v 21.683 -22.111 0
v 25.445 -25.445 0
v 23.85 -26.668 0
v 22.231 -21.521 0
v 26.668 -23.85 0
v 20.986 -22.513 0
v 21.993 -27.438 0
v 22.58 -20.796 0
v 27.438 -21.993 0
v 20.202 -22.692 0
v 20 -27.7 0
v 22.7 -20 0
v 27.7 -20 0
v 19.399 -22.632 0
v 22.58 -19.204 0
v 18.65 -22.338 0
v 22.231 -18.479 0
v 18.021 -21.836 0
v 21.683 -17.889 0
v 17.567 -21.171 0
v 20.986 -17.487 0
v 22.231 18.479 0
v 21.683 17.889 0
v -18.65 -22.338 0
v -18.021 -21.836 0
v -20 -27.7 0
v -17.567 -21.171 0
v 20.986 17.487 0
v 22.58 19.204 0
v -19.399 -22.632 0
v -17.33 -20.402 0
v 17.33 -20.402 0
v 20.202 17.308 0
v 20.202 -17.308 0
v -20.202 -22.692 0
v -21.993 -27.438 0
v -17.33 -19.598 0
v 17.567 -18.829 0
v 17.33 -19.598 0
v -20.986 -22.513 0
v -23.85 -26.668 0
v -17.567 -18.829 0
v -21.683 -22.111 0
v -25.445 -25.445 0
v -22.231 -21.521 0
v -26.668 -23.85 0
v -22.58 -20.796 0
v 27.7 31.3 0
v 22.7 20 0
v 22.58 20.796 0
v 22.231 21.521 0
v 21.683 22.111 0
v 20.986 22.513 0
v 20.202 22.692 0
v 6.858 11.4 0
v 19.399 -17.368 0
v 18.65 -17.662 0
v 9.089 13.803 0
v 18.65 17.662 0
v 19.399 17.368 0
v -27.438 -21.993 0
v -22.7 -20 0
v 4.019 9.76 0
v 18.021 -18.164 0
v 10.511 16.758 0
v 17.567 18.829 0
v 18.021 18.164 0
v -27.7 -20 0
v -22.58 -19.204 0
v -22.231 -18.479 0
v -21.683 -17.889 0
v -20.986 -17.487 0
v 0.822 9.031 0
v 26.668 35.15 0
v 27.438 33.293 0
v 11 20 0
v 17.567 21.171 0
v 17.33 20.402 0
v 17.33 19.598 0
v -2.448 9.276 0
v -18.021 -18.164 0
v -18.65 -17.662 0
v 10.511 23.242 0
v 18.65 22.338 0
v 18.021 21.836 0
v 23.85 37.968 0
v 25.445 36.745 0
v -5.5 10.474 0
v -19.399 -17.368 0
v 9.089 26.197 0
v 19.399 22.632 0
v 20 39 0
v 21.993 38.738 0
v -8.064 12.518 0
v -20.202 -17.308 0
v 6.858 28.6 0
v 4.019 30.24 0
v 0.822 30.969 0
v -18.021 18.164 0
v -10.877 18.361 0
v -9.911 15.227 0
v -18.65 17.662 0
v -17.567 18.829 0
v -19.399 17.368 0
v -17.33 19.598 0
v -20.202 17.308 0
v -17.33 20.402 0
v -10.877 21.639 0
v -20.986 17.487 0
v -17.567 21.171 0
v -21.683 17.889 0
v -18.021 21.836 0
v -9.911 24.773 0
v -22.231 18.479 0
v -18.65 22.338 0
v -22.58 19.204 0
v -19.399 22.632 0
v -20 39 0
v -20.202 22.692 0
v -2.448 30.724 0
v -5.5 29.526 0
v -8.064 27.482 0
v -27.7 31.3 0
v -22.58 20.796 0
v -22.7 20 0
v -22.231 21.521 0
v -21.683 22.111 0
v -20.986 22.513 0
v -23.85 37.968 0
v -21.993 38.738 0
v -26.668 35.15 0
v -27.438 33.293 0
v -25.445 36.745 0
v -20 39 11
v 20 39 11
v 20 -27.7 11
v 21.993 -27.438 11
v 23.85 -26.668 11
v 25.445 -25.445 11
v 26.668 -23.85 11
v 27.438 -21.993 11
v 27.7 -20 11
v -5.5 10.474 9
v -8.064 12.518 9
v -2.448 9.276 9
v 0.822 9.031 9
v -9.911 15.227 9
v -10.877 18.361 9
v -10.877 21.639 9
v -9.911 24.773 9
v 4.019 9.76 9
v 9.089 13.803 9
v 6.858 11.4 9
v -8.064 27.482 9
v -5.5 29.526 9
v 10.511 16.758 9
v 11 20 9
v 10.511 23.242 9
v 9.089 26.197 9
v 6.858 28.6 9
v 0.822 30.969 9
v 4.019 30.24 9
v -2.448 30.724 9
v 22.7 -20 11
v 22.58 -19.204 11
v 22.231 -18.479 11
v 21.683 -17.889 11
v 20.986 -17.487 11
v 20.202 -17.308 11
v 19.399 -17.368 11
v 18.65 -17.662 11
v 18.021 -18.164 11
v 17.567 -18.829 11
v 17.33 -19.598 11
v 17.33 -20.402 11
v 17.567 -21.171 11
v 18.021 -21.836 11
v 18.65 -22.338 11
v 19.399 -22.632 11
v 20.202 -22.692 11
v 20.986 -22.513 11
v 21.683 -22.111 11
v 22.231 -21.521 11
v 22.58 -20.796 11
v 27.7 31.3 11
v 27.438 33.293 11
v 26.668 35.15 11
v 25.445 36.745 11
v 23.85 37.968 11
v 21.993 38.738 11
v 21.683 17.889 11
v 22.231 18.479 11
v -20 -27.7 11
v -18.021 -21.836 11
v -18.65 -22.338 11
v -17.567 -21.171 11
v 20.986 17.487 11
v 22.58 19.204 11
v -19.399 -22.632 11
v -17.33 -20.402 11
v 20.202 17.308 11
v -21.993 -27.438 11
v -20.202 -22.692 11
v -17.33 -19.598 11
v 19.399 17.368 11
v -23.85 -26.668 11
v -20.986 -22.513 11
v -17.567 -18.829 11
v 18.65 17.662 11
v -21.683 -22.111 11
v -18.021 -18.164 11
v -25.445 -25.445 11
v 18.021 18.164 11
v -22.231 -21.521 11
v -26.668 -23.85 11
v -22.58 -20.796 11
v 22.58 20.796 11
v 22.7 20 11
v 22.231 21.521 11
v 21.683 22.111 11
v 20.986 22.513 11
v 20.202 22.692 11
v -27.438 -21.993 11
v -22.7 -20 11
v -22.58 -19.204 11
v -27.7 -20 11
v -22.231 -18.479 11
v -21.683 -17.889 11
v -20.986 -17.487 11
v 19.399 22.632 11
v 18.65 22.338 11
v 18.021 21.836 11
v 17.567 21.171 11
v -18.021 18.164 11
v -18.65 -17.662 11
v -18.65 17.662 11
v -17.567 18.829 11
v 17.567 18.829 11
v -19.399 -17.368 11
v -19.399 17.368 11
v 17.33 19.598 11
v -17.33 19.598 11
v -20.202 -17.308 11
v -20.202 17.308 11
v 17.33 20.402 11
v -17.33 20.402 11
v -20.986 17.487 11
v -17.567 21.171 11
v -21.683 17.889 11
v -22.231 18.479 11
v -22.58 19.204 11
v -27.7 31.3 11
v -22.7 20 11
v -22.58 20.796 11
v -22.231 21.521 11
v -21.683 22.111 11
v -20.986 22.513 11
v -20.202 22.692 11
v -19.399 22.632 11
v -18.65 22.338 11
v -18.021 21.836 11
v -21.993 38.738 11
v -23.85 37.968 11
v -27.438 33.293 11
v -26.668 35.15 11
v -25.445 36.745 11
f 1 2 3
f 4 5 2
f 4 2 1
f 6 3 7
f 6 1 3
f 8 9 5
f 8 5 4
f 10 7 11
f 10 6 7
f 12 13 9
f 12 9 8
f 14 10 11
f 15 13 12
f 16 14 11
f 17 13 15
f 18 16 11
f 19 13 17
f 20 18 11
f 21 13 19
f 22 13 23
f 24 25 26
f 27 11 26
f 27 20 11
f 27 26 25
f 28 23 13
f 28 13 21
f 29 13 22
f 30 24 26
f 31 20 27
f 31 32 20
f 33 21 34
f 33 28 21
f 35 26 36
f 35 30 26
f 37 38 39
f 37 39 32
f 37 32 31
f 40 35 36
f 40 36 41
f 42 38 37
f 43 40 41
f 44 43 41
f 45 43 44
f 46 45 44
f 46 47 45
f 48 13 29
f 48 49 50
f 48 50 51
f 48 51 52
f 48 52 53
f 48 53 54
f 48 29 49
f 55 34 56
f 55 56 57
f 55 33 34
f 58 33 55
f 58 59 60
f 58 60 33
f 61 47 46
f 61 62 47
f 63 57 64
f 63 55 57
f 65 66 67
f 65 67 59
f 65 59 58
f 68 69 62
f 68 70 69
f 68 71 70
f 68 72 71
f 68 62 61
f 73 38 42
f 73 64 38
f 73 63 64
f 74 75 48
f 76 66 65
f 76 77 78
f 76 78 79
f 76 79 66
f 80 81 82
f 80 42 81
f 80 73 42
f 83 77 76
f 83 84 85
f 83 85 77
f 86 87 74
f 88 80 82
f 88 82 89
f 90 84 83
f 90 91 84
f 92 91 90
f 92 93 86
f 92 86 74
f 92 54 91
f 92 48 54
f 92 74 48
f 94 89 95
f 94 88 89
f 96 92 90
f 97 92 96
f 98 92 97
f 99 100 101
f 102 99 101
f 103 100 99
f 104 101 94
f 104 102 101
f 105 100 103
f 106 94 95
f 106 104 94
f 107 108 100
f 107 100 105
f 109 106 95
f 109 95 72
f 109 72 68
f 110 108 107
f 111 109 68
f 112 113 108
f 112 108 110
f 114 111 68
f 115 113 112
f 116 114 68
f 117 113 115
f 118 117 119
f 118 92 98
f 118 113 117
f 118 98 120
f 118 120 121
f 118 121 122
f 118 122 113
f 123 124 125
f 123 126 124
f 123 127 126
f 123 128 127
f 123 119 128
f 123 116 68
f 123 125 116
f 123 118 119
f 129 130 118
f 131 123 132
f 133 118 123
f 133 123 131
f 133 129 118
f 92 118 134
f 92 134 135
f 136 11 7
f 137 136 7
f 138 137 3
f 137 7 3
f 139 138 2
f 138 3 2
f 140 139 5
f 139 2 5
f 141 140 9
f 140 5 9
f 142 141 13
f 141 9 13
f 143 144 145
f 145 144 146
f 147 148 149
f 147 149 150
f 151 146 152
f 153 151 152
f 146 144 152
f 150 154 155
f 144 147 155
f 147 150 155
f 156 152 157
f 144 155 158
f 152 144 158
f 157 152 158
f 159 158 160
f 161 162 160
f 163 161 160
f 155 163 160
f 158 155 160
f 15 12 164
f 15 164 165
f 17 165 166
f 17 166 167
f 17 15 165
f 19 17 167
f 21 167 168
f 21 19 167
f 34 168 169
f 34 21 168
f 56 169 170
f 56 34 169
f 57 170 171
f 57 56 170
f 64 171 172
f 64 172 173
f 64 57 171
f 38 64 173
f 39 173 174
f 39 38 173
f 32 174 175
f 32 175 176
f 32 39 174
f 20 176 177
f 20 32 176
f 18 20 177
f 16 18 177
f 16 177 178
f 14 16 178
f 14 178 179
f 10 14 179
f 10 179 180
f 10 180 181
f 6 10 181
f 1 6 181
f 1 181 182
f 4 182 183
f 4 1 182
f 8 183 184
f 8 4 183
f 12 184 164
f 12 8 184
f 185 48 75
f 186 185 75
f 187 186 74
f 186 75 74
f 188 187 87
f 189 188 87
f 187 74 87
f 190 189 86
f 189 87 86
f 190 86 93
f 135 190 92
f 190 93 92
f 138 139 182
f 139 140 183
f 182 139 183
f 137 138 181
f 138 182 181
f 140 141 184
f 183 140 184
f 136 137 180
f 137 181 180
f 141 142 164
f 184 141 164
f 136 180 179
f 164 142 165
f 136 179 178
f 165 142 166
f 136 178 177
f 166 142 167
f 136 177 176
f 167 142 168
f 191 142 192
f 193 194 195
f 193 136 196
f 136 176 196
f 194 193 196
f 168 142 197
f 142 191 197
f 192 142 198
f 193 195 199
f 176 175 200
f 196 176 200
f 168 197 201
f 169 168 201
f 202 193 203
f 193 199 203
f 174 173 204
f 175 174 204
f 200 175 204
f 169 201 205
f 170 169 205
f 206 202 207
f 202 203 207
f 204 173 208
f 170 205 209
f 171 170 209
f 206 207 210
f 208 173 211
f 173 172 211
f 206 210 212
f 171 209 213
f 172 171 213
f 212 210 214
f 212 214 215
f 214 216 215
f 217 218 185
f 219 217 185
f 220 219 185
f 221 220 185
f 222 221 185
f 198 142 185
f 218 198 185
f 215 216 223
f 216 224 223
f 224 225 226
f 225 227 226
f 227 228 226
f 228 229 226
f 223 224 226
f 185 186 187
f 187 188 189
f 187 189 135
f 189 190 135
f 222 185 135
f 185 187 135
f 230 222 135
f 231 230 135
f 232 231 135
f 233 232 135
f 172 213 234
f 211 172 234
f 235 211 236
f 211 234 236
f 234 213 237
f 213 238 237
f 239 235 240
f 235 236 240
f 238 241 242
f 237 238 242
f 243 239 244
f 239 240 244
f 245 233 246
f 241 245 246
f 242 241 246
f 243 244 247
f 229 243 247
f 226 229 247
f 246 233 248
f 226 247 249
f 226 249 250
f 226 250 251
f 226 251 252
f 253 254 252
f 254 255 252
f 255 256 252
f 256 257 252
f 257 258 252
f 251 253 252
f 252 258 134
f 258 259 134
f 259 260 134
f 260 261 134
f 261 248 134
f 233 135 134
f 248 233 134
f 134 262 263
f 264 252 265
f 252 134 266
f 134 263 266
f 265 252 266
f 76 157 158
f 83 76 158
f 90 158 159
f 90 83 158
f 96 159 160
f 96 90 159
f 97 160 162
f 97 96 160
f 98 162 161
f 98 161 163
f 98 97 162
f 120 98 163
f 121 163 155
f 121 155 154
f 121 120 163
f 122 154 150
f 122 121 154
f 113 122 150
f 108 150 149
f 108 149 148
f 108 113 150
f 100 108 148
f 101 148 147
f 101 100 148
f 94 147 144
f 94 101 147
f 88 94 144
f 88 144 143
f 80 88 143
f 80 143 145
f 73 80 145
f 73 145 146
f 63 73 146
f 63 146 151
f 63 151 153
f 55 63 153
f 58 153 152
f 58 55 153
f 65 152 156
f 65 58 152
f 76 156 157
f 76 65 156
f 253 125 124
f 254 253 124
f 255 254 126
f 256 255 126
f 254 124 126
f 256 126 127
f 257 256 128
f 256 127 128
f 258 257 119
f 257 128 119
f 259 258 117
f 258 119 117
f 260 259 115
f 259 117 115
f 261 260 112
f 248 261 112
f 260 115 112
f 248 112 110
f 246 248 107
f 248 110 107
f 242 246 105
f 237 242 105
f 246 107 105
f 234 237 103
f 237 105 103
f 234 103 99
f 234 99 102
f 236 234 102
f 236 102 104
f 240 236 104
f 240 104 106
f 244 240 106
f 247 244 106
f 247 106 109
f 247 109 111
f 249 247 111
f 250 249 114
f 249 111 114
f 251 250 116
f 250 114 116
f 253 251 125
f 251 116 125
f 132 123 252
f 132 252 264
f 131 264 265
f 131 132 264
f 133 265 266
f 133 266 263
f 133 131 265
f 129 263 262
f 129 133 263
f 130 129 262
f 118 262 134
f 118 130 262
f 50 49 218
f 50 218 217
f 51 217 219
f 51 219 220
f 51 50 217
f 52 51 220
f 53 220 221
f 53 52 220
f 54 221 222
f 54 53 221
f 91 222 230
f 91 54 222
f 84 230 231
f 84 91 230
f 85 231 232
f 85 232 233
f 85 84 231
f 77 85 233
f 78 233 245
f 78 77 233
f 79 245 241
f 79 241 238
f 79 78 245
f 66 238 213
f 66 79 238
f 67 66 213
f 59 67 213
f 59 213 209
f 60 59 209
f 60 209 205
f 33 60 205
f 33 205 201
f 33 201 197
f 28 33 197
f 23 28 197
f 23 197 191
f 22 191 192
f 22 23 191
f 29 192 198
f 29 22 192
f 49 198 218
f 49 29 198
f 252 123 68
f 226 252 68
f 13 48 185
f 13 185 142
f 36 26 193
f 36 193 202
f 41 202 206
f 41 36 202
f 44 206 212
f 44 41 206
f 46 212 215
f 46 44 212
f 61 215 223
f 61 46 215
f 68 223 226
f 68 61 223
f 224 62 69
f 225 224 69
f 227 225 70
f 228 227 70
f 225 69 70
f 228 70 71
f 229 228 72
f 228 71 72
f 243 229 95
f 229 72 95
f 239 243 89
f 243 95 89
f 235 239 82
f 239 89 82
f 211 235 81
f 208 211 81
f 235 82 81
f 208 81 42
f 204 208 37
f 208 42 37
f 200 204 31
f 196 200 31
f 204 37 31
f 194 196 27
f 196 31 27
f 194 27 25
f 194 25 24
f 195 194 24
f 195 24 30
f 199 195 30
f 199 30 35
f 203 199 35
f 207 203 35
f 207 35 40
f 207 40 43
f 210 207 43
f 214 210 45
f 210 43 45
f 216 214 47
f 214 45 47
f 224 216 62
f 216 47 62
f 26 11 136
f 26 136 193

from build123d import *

# Parameters (mm, degrees)
SKETCH_R     = 2.7
PAD_DEPTH    = 11
SKETCH001_R  = 11
POCKET_DEPTH = 9


with BuildPart() as part:
    # Sketch → Pad (new body)
    with BuildSketch(Plane.XY):
        with BuildLine():
            Line((20, 39), (0, 39))
            Line((0, 39), (0, 0))
            Line((0, 0), (0, -27.7))
            Line((0, -27.7), (20, -27.7))
            ThreePointArc((20, -27.7), (25.444722, -25.444722), (27.7, -20))
            Line((27.7, 0), (27.7, -20))
            Line((27.7, 31.3), (27.7, 0))
            ThreePointArc((27.7, 31.3), (25.444722, 36.744722), (20, 39))
        make_face()
        with Locations((20, 20)):
            Circle(SKETCH_R, mode=Mode.SUBTRACT)
        with Locations((20, -20)):
            Circle(SKETCH_R, mode=Mode.SUBTRACT)
    pad = extrude(amount=PAD_DEPTH)

    # Mirrored: Pad across Sketch V_Axis
    add(pad.mirror(Plane(origin=(0, 0, 0), x_dir=(0, 0, 1), z_dir=(1, 0, 0))))

    # Sketch001 → Pocket (cut)
    with BuildSketch(Plane.XY):
        with Locations((0, 20)):
            Circle(SKETCH001_R)
    extrude(amount=POCKET_DEPTH, mode=Mode.SUBTRACT)


solid = part.part
